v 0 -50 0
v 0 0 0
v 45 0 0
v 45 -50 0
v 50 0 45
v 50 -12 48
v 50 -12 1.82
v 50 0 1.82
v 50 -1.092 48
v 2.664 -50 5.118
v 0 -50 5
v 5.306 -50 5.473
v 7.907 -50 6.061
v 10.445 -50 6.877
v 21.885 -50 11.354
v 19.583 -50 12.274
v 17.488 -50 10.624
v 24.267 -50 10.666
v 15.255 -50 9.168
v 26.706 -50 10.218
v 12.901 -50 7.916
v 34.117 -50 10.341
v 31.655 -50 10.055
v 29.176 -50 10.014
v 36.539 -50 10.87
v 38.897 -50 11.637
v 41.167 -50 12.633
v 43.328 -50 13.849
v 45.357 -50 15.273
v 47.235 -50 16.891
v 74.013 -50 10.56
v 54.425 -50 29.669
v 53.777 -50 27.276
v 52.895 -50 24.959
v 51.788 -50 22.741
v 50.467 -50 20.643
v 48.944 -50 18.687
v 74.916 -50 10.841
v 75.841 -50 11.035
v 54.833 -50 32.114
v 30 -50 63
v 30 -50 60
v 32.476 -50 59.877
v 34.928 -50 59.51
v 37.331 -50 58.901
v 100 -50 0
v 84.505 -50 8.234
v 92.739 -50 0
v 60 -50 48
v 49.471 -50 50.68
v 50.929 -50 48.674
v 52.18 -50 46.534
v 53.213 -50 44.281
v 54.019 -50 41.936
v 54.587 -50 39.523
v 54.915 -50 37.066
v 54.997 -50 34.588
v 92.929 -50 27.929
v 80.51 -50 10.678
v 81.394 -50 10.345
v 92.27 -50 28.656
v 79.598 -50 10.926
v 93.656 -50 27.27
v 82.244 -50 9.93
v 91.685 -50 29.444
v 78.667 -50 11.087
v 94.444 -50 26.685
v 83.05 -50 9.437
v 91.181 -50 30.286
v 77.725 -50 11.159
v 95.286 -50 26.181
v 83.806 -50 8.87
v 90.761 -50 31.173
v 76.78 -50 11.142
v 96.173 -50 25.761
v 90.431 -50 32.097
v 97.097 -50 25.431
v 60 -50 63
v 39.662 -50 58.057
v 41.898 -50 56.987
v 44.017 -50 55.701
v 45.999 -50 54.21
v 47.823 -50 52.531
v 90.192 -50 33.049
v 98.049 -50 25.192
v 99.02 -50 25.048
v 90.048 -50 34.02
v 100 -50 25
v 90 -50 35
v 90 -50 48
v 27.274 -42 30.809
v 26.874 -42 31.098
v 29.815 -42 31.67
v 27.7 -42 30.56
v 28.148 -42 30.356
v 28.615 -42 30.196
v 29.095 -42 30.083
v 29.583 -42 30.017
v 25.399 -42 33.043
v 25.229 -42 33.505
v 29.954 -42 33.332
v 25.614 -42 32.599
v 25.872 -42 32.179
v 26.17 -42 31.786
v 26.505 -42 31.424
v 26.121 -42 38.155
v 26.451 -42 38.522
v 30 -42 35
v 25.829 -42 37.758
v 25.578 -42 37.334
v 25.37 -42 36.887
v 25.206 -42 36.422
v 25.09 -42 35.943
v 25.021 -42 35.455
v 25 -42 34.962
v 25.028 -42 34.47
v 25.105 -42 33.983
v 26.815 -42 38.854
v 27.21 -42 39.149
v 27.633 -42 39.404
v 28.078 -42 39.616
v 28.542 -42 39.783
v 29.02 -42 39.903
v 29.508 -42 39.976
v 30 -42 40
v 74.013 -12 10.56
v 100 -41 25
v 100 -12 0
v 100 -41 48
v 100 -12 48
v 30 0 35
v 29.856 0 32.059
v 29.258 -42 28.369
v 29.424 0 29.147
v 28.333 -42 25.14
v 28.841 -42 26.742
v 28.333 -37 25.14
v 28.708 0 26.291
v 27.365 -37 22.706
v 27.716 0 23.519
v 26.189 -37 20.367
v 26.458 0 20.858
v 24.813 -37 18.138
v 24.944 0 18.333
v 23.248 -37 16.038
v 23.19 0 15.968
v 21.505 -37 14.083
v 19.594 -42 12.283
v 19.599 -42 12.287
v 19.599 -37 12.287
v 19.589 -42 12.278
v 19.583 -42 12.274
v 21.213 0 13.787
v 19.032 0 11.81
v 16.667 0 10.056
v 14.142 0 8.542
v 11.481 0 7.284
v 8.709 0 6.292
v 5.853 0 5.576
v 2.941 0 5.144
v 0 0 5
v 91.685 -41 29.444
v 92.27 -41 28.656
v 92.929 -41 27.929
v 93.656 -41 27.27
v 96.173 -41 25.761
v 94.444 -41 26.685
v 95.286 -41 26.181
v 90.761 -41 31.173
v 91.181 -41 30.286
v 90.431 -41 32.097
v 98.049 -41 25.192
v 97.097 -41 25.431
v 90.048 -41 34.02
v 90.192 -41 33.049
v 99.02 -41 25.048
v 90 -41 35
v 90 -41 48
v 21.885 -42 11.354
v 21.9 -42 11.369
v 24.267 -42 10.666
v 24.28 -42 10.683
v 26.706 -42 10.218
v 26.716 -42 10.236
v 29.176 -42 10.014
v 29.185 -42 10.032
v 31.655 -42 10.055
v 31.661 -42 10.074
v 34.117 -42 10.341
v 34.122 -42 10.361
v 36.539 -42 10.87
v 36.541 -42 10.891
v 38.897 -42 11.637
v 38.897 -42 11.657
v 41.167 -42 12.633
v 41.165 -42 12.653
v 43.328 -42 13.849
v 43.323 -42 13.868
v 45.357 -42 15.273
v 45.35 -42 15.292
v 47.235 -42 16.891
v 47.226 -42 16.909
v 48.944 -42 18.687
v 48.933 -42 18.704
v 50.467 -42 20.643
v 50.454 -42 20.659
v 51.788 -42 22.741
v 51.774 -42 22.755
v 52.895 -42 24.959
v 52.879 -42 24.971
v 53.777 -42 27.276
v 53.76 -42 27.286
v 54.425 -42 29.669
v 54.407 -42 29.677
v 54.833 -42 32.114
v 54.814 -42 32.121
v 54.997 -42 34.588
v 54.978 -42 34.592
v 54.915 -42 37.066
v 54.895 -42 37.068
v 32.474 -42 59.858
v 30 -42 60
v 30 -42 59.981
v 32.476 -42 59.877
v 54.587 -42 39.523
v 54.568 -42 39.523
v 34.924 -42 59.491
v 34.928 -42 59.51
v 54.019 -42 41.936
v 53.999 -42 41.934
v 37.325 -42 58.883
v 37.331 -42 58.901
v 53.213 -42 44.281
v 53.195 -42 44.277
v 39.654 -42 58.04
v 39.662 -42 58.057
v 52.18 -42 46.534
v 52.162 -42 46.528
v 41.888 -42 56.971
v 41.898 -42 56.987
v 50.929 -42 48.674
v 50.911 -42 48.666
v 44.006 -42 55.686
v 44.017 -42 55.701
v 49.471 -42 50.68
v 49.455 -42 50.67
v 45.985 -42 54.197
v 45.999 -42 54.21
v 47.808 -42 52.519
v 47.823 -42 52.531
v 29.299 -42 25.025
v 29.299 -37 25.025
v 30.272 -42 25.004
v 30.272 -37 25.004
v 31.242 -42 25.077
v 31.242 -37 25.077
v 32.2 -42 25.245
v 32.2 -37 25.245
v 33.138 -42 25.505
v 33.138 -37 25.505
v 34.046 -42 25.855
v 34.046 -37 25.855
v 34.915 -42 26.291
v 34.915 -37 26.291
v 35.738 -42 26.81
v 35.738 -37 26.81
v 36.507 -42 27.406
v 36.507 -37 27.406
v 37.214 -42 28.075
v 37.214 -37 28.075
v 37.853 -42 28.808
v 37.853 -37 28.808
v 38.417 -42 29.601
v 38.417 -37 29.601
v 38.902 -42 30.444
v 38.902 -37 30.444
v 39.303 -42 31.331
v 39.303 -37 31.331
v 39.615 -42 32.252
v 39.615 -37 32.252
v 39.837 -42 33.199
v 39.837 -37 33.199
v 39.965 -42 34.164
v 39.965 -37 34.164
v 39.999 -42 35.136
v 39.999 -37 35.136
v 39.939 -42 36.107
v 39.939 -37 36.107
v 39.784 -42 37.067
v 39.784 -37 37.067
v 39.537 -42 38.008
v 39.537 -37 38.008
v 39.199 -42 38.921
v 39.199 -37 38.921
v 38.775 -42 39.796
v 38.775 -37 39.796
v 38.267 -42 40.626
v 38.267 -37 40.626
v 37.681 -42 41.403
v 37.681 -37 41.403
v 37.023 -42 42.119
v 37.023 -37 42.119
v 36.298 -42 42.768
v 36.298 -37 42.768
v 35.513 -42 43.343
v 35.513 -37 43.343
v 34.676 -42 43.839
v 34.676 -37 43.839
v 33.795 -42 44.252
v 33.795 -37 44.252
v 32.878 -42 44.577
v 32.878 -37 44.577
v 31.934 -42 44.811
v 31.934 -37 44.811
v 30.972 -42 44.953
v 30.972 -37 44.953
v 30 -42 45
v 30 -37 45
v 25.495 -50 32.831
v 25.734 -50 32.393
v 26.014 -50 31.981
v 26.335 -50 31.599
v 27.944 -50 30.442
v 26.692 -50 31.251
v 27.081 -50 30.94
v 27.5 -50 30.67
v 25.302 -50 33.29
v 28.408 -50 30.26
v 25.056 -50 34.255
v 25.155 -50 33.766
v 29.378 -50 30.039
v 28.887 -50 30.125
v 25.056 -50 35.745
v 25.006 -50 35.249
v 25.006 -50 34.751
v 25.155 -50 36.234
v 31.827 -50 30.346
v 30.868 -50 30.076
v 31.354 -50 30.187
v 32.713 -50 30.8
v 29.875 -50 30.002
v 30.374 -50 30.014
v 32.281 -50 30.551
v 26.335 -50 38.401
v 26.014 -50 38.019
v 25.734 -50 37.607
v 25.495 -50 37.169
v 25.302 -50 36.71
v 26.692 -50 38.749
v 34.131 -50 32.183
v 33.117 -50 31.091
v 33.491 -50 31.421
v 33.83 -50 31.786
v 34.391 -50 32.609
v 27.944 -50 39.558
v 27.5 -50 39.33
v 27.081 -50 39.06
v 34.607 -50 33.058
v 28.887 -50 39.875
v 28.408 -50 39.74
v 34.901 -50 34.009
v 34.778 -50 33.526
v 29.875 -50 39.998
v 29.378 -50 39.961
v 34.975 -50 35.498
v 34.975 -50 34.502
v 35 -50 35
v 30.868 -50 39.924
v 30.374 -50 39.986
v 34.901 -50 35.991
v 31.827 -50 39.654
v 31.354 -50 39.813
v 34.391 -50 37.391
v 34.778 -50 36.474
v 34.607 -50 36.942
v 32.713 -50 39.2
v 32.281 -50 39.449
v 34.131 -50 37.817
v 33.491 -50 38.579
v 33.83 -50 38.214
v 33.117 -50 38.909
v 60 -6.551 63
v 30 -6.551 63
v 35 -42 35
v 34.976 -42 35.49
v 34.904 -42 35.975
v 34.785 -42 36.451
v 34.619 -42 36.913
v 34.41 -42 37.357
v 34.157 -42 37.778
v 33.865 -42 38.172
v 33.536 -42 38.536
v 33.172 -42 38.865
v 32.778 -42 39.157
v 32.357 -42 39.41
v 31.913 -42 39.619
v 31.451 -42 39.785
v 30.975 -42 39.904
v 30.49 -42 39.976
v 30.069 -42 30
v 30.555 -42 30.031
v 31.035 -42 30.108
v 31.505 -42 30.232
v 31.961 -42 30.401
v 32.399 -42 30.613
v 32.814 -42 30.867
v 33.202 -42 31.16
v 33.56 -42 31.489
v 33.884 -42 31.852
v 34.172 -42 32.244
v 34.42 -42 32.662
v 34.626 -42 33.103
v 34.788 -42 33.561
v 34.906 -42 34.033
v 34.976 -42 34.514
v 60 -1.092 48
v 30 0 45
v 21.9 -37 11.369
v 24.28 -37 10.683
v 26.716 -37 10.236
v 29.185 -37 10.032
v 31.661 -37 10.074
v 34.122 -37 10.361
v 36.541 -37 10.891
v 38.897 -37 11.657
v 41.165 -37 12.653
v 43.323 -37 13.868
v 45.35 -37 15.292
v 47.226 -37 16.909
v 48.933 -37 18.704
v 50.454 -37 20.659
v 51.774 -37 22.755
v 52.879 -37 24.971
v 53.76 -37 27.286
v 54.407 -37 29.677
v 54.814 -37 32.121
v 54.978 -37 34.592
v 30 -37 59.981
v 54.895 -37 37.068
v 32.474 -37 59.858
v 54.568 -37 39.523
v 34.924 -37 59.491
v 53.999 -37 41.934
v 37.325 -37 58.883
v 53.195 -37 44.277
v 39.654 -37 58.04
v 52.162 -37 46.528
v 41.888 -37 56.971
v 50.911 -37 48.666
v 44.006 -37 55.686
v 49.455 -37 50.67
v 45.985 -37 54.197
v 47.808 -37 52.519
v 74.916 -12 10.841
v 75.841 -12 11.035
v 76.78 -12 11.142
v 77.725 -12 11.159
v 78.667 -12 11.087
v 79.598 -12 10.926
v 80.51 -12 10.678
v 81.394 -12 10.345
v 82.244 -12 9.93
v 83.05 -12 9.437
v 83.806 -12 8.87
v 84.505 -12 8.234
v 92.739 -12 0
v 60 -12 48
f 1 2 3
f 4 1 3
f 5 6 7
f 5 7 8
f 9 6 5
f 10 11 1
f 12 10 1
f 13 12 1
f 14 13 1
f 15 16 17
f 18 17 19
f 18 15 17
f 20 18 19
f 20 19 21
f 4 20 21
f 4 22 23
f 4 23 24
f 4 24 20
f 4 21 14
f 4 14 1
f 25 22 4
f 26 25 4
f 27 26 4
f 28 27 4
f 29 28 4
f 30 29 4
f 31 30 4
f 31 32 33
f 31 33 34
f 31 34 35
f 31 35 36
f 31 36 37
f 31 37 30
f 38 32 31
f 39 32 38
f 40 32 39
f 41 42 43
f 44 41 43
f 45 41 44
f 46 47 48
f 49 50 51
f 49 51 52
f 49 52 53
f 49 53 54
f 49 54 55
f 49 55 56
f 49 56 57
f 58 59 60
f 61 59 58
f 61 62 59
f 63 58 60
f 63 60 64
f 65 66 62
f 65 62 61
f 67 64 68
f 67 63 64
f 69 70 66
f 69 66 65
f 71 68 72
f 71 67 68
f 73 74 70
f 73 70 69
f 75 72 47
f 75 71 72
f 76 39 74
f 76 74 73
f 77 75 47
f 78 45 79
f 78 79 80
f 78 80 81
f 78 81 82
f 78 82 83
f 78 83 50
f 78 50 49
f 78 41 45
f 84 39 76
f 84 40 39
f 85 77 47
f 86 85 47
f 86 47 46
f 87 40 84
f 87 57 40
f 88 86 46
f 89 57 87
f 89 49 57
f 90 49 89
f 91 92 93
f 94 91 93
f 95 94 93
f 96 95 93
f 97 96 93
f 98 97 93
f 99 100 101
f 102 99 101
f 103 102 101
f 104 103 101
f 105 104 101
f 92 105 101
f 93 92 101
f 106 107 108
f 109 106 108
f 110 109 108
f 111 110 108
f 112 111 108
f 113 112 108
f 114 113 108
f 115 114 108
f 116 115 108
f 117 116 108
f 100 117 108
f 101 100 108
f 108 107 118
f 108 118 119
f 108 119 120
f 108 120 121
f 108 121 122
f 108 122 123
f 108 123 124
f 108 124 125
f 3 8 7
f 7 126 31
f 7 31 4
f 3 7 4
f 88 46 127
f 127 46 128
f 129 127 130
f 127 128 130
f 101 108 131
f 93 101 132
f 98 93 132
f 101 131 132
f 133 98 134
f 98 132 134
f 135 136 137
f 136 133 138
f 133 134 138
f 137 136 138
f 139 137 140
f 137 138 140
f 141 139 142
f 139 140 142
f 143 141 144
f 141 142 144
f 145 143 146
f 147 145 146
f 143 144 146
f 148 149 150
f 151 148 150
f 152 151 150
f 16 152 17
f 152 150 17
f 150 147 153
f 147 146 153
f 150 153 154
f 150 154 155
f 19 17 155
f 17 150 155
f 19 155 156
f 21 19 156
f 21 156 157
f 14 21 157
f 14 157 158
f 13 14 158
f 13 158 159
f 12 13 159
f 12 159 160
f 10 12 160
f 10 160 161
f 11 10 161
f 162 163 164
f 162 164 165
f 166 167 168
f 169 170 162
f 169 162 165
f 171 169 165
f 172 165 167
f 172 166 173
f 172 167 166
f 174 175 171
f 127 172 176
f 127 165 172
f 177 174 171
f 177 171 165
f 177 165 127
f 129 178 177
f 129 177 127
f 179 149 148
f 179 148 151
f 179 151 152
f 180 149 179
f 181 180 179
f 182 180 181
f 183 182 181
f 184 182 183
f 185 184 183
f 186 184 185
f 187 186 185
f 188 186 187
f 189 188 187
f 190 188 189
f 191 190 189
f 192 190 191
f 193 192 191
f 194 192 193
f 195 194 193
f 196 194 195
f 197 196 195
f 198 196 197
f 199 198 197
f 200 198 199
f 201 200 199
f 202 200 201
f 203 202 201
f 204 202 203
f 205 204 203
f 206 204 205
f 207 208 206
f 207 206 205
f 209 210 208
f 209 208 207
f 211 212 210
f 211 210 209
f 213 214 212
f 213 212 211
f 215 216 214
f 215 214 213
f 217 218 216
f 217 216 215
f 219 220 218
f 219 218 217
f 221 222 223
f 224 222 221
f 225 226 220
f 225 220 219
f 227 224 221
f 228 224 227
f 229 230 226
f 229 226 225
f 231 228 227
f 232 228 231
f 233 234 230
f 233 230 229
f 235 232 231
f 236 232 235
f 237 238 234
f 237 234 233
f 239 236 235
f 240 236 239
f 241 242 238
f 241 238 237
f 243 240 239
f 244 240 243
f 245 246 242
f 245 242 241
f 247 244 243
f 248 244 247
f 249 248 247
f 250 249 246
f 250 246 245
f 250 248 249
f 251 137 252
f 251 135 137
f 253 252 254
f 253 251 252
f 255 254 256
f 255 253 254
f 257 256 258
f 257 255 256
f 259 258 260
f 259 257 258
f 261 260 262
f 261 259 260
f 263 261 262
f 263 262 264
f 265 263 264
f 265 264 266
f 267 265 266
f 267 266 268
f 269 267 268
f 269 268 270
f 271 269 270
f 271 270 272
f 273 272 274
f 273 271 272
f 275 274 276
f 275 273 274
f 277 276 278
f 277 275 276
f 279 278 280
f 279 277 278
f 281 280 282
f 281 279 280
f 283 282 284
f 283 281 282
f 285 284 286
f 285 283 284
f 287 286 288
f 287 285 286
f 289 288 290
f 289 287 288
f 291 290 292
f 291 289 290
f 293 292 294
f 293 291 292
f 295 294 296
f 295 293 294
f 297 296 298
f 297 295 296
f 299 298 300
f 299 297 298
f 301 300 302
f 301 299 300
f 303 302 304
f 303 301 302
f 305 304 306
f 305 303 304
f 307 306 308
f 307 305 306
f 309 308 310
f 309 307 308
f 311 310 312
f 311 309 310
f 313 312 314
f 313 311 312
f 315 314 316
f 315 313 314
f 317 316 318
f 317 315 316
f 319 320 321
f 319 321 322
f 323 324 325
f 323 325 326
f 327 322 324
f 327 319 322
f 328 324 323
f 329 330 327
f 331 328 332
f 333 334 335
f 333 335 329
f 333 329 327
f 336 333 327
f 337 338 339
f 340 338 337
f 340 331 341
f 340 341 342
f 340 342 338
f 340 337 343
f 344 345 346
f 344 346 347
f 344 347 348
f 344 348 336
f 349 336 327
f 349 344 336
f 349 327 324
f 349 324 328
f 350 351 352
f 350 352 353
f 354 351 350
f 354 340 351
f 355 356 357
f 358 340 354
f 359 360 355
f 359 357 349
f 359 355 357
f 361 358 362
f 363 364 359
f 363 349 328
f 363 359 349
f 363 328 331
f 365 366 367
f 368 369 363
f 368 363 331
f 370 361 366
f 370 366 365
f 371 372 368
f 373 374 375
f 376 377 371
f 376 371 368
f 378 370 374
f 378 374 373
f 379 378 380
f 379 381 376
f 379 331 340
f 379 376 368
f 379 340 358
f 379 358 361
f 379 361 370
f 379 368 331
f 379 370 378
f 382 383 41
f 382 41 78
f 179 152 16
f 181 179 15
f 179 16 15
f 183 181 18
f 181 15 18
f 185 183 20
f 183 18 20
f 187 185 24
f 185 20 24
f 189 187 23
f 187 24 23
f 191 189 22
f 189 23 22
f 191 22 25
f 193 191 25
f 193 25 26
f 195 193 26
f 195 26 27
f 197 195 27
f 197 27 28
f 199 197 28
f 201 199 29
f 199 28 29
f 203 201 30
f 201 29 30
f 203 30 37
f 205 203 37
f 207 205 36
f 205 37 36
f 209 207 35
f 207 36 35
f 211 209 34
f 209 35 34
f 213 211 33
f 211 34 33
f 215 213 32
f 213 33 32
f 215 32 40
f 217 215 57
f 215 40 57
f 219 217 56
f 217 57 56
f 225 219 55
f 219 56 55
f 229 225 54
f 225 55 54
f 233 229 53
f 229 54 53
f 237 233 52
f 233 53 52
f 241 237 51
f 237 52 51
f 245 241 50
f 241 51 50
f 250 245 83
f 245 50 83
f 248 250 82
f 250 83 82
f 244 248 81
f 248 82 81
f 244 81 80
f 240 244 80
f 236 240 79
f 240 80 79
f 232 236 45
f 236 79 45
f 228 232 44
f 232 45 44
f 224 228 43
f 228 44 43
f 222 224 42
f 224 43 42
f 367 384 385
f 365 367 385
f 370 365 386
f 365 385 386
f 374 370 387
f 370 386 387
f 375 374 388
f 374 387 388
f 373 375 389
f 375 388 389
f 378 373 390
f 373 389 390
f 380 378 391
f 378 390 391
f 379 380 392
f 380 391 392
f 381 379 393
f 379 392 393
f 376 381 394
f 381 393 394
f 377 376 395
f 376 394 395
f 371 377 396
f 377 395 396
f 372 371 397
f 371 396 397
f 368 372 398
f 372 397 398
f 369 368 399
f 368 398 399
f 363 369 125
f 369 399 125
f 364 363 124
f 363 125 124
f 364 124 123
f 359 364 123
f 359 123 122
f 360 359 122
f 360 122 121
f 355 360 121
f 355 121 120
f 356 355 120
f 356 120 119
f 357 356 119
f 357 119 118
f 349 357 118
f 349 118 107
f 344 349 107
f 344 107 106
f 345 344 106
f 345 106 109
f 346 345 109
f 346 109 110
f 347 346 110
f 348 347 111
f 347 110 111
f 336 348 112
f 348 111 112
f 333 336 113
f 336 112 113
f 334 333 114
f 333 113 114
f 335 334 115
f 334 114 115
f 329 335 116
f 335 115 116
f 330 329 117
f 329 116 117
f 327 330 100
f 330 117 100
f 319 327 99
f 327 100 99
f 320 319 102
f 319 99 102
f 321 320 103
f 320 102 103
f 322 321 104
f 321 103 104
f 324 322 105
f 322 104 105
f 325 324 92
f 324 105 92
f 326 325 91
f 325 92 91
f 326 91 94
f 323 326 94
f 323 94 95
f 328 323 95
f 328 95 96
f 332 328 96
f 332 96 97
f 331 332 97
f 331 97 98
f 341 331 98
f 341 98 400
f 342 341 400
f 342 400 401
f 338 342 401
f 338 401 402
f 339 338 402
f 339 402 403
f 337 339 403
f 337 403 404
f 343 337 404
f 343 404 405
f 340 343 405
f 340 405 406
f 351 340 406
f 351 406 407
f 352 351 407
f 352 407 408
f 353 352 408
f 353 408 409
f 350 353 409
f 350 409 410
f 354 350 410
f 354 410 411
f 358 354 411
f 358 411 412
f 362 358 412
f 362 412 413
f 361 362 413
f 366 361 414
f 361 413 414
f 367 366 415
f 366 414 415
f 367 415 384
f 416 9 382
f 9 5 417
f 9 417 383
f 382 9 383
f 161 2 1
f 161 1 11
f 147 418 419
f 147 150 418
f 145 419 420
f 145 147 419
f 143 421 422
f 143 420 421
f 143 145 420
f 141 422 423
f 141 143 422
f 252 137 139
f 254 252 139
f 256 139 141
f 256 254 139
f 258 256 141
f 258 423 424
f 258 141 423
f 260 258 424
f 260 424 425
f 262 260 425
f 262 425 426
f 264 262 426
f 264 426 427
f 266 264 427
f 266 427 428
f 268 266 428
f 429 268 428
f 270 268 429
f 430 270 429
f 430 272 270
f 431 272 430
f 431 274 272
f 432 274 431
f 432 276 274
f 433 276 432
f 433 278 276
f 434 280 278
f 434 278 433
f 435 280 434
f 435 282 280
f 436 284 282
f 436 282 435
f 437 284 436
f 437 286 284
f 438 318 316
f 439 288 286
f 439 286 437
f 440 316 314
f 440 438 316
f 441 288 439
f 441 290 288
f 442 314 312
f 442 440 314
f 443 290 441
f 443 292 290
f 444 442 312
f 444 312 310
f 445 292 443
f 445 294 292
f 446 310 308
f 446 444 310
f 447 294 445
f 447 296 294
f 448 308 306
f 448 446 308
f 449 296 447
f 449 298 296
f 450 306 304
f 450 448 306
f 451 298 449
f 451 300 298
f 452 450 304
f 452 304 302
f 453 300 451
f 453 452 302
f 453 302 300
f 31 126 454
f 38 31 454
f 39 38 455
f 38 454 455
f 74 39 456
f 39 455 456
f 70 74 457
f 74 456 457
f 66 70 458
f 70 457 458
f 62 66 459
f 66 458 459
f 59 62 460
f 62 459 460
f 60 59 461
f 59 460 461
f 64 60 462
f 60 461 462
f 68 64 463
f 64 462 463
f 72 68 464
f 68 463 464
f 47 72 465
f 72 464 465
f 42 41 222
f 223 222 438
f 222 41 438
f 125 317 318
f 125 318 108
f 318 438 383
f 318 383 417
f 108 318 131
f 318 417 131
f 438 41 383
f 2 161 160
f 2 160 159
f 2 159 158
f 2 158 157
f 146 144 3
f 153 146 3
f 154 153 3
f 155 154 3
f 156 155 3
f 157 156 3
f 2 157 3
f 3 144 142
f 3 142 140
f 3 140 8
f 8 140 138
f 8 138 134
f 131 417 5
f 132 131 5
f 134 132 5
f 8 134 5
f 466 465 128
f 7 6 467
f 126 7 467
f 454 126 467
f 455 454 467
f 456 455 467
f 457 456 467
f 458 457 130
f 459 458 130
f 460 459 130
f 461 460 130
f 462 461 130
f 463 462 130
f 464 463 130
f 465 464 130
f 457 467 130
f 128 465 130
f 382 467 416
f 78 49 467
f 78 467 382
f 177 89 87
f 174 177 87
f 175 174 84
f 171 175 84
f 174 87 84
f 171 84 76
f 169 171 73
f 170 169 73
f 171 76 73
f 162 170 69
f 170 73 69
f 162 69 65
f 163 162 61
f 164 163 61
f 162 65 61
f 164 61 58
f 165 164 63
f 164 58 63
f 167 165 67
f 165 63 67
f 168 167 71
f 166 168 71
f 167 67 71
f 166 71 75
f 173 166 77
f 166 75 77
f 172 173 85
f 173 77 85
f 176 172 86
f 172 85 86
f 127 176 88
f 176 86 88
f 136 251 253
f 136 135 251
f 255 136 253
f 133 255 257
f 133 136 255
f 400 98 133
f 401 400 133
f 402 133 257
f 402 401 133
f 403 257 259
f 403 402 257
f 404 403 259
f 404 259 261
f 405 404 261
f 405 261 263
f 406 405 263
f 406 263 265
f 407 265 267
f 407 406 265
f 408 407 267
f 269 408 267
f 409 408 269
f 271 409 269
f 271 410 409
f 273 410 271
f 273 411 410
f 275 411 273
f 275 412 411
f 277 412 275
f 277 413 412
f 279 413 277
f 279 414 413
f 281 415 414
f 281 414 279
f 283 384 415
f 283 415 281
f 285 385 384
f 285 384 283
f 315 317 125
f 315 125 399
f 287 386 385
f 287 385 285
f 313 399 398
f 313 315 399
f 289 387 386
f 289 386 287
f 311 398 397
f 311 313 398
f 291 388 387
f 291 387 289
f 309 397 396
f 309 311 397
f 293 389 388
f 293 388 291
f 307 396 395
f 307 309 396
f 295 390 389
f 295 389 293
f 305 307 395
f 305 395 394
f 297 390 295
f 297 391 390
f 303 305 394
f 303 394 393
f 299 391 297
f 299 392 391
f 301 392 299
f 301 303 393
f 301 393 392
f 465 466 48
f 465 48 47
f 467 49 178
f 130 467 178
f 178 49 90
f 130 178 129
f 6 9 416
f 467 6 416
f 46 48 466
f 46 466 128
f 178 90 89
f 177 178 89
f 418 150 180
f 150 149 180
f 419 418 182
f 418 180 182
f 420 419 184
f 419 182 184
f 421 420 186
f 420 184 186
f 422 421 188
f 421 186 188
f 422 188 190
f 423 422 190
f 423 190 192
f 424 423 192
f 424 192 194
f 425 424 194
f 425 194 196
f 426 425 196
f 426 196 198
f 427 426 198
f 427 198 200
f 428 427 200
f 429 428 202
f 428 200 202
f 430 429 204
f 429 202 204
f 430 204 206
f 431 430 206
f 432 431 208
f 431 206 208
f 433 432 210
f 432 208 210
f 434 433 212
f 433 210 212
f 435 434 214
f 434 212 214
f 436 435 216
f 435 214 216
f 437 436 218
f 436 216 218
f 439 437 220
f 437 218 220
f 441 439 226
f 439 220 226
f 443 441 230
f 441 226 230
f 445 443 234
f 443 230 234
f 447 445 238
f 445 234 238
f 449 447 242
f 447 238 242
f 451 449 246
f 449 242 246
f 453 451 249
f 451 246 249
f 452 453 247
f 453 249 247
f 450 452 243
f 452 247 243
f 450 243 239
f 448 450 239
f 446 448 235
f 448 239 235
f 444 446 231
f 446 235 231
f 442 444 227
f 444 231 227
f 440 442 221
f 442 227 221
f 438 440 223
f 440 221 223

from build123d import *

# Parameters (mm, degrees)
F0_W      = 100
F0_H      = 63
F1_DEPTH  = 50
F2_W      = 40
F2_H      = 15
F3_DEPTH  = 50
F5_DEPTH  = 9
F6_R      = 10
F7_W      = 50
F7_H      = 12
F8_DEPTH  = 48.001
F10_DEPTH = 50
F11_R     = 25
F12_DEPTH = 8
F13_R     = 24.9809
F13_R_2   = 10
F14_DEPTH = 5
F15_R     = 5
F16_DEPTH = 8
F18_DEPTH = 70.001


with BuildPart() as f1:
    # F0 (on Front) → F1 (new body)
    with BuildSketch(Plane.XZ):
        with Locations((50, 31.5)):
            Rectangle(F0_W, F0_H)
    extrude(amount=F1_DEPTH)

    # F2 (on face) → F3 (cut, through all)
    with BuildSketch(Plane.XZ.offset(50)):
        with Locations((80, 55.5)):
            Rectangle(F2_W, F2_H)
        Polygon((80, 12.7389581993), (45, 0), (92.7389581993, 0), align=None)
    extrude(amount=-F3_DEPTH, mode=Mode.SUBTRACT)

    # F4 (on face) → F5 (cut)
    with BuildSketch(Plane.XZ.offset(50)):
        with BuildLine():
            Line((100, 25), (100, 48))
            Line((100, 48), (90, 48))
            Line((90, 48), (90, 35))
            ThreePointArc((90, 35), (92.9289321881, 27.9289321881), (100, 25))
        make_face()
    extrude(amount=-F5_DEPTH, mode=Mode.SUBTRACT)

    # F6
    f6_edges = [f1.edges().sort_by_distance(p)[0] for p in [
        (80, -25, 12.738958),
    ]]
    fillet(f6_edges, radius=F6_R)

    # F7 (on face) → F8 (cut, through all)
    with BuildSketch(Plane.XY.offset(48)):
        with Locations((75, -6)):
            Rectangle(F7_W, F7_H)
    extrude(amount=-F8_DEPTH, mode=Mode.SUBTRACT)

    # F9 (on face) → F10 (cut, through all)
    with BuildSketch(Plane(origin=(0, 0, 0), x_dir=(-1, 0, 0), z_dir=(0, 1, 0))):
        with BuildLine():
            Line((-30, 63), (-30, 35))
            ThreePointArc((-30, 35), (-21.2132034356, 13.7867965644), (0, 5))
            Line((0, 5), (0, 63))
            Line((0, 63), (-30, 63))
        make_face()
    extrude(amount=-F10_DEPTH, mode=Mode.SUBTRACT)

    # F11 (on face) → F12 (cut)
    with BuildSketch(Plane.XZ.offset(50)):
        with Locations((30, 35)):
            Circle(F11_R)
    extrude(amount=-F12_DEPTH, mode=Mode.SUBTRACT)

    # F13 (on face) → F14 (cut)
    with BuildSketch(Plane.XZ.offset(42)):
        with Locations((30, 35)):
            Circle(F13_R)
        with Locations((30, 35)):
            Circle(F13_R_2, mode=Mode.SUBTRACT)
    extrude(amount=-F14_DEPTH, mode=Mode.SUBTRACT)

    # F15 (on face) → F16 (join, through all)
    with BuildSketch(Plane.XZ.offset(42)):
        with Locations((30, 35)):
            Circle(F15_R)
    extrude(amount=F16_DEPTH)

    # F17 (on face) → F18 (cut, through all)
    with BuildSketch(Plane(origin=(30, 0, 0), x_dir=(0, -1, 0), z_dir=(-1, 0, 0))):
        Polygon((6.5514642168, 63), (0, 63), (0, 45), align=None)
    extrude(amount=-F18_DEPTH, mode=Mode.SUBTRACT)


solid = f1.part
